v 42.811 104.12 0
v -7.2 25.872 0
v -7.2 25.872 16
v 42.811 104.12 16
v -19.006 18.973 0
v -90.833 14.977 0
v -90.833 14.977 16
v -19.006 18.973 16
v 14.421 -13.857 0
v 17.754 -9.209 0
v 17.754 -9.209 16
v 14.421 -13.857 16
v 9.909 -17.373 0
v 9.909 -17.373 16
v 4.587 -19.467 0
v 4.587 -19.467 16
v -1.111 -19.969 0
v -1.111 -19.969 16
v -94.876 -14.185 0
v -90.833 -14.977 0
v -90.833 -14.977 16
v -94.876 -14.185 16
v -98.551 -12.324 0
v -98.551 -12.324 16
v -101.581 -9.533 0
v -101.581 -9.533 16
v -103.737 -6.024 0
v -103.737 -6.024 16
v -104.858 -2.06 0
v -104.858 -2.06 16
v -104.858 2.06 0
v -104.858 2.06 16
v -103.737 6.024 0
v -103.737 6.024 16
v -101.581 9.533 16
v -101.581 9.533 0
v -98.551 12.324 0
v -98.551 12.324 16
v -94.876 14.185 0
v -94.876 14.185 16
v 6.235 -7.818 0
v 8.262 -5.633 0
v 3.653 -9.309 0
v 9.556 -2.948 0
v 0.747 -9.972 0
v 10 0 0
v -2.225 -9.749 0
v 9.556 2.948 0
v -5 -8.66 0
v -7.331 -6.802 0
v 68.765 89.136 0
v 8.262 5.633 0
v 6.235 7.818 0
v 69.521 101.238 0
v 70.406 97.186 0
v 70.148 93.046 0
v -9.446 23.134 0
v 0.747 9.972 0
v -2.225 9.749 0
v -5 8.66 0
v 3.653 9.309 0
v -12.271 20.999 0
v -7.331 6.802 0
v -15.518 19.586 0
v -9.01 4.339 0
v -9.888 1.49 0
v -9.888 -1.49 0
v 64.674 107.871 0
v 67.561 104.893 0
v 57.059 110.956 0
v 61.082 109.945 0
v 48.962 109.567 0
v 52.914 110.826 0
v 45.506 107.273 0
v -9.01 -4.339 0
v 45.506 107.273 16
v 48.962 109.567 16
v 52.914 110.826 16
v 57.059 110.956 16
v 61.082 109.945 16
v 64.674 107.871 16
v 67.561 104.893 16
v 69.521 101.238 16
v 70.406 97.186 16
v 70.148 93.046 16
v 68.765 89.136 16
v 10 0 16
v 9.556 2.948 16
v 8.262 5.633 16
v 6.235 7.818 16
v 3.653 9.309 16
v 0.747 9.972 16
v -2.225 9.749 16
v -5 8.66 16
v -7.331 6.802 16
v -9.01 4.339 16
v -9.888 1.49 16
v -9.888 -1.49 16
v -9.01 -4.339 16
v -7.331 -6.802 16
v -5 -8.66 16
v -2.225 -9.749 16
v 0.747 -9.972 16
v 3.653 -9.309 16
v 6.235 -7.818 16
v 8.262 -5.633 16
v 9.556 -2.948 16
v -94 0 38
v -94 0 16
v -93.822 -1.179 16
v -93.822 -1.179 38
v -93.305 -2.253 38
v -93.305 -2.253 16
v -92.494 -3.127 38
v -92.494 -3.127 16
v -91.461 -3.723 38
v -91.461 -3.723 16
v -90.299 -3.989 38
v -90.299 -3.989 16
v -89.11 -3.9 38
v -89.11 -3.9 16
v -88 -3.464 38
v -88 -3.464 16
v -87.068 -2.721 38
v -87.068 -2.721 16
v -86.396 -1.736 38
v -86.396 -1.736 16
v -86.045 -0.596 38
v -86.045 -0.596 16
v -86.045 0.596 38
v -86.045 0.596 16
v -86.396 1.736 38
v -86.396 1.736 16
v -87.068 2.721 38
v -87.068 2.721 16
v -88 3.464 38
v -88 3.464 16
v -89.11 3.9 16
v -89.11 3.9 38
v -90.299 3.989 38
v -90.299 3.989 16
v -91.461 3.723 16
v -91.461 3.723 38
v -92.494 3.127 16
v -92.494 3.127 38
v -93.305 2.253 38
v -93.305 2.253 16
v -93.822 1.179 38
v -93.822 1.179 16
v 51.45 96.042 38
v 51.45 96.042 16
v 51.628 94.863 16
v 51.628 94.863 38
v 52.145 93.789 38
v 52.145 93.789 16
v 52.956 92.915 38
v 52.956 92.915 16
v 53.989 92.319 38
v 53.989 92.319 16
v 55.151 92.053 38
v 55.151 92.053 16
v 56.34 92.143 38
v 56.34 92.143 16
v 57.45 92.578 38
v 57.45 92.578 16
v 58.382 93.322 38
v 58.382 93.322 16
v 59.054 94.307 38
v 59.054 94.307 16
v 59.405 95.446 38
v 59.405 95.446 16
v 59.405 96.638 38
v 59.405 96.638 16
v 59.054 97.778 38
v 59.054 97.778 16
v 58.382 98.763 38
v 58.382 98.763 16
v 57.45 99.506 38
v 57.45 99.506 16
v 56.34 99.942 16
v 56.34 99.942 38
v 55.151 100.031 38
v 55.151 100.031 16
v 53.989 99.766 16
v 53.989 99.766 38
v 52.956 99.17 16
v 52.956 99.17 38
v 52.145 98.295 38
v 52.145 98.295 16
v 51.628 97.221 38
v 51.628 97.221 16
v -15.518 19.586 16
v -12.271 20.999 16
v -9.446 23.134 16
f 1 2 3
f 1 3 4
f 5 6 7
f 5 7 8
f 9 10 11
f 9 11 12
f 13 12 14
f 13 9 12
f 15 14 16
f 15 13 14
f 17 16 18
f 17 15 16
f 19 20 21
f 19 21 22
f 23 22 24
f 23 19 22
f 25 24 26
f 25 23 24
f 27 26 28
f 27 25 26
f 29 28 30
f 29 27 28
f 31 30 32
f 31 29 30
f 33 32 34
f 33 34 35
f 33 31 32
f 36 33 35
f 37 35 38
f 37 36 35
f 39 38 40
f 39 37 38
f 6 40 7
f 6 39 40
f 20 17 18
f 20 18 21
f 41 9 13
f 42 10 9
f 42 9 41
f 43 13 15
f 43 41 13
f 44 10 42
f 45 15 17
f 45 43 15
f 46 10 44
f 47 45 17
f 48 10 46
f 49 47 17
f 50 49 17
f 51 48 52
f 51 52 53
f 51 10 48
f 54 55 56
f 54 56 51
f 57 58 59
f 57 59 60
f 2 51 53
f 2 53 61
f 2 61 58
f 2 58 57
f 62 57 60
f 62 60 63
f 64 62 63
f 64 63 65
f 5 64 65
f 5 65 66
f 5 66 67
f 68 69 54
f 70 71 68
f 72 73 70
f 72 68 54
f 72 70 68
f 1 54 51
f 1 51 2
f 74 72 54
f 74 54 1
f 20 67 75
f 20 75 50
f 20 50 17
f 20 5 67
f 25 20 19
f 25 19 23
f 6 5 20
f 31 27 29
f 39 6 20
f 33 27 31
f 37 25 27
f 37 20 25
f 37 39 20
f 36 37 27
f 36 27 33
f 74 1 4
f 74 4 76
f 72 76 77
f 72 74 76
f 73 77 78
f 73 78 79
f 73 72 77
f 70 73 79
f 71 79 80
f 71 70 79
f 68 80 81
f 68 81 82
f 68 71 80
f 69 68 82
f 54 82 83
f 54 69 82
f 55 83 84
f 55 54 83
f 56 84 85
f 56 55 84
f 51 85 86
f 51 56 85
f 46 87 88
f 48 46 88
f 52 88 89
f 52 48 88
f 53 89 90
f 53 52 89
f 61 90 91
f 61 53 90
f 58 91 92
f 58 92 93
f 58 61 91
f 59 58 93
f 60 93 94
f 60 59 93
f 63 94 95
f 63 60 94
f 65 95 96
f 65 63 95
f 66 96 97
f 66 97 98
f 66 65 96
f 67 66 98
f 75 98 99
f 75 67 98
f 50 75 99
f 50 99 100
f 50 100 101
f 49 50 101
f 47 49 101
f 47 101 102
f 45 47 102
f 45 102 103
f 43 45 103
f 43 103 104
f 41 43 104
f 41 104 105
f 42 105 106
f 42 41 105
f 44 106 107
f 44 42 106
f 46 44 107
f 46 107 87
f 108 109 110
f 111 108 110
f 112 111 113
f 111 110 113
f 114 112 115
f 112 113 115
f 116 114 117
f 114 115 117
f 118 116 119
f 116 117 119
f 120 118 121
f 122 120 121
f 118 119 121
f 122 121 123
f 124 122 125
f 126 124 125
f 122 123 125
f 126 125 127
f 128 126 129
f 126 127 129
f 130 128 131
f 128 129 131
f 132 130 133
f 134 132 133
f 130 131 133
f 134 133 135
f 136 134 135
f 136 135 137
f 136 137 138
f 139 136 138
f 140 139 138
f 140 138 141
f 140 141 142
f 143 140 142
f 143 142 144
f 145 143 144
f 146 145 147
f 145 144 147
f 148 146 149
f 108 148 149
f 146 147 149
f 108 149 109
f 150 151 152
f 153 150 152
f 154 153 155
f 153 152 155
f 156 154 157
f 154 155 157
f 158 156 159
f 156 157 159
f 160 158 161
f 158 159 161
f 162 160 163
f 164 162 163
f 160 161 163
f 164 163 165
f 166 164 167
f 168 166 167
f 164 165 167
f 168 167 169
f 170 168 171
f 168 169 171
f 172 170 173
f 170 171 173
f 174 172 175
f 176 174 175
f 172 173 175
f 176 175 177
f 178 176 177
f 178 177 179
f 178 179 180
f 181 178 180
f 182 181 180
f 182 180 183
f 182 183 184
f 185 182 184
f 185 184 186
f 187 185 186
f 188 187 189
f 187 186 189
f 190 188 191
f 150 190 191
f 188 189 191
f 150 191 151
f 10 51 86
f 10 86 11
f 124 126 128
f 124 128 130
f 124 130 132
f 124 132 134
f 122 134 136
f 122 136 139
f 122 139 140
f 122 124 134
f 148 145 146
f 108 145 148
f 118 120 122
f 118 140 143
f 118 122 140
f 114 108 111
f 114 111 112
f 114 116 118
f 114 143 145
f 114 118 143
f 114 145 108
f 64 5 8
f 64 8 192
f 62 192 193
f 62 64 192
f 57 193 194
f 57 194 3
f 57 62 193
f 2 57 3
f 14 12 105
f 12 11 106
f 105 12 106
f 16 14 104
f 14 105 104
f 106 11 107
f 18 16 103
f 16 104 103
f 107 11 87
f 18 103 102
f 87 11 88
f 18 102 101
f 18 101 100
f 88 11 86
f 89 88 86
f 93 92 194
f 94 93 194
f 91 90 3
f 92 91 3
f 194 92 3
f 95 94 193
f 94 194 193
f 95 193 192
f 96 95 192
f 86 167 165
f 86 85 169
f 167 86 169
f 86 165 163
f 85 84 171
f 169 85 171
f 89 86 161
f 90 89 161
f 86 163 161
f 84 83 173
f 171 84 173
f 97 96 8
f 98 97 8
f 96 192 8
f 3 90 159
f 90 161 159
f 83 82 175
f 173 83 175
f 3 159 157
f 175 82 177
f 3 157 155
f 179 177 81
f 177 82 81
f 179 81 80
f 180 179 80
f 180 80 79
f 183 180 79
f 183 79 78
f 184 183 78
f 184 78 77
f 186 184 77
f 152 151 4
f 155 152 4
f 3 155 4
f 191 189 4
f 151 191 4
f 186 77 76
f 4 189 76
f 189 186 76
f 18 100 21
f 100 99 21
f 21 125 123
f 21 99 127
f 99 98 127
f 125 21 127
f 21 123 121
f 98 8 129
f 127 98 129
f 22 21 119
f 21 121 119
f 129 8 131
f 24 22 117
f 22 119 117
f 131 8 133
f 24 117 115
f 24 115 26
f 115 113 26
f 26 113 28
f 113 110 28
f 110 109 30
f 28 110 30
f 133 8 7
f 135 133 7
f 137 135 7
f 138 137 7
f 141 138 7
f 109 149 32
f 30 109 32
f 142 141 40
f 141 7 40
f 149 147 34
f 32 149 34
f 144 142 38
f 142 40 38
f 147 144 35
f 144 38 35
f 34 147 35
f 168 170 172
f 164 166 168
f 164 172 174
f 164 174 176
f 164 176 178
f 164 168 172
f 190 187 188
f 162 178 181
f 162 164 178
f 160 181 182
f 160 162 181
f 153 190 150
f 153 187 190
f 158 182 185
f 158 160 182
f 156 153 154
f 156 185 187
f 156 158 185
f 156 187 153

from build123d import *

# Parameters (mm, degrees)
EXTRUDE_1_DEPTH     = 16
SKETCH_2_R          = 4
EXTRUDE_2_DEPTH     = 22
SKETCH_3_R          = 10
CUT_EXTRUDE_1_DEPTH = 16


with BuildPart() as part:
    # 草图1 → 凸台-拉伸1 (new body)
    with BuildSketch(Plane.XY):
        with BuildLine():
            Line((68.765313927, 89.135523785), (17.753751903, -9.208924659))
            ThreePointArc((17.753751903, -9.208924659), (9.909075677, -17.372686011), (-1.111111111, -19.969111951))
            Line((-1.111111111, -19.969111951), (-90.833333333, -14.976833963))
            ThreePointArc((-90.833333333, -14.976833963), (-105, 0), (-90.833333333, 14.976833963))
            Line((-90.833333333, 14.976833963), (-19.005850553, 18.973422013))
            ThreePointArc((-19.005850553, 18.973422013), (-12.271196702, 20.999365274), (-7.200154901, 25.872202603))
            Line((-7.200154901, 25.872202603), (42.810971014, 104.120270653))
            ThreePointArc((42.810971014, 104.120270653), (62.95, 109.032598336), (68.765313927, 89.135523785))
        make_face()
    extrude(amount=EXTRUDE_1_DEPTH)

    # 草图2 → 凸台-拉伸2 (add)
    with BuildSketch(Plane.XY.offset(16)):
        with Locations(Location((-90, 0, 0), (0, 0, 180))):
            Circle(SKETCH_2_R)
        with Locations(Location((55.45, 96.04221728, 0), (0, 0, 180))):
            Circle(SKETCH_2_R)
    extrude(amount=EXTRUDE_2_DEPTH)

    # 草图3 → 切除-拉伸1 (cut)
    with BuildSketch(Plane.XY):
        Circle(SKETCH_3_R)
    extrude(amount=CUT_EXTRUDE_1_DEPTH, mode=Mode.SUBTRACT)


solid = part.part
